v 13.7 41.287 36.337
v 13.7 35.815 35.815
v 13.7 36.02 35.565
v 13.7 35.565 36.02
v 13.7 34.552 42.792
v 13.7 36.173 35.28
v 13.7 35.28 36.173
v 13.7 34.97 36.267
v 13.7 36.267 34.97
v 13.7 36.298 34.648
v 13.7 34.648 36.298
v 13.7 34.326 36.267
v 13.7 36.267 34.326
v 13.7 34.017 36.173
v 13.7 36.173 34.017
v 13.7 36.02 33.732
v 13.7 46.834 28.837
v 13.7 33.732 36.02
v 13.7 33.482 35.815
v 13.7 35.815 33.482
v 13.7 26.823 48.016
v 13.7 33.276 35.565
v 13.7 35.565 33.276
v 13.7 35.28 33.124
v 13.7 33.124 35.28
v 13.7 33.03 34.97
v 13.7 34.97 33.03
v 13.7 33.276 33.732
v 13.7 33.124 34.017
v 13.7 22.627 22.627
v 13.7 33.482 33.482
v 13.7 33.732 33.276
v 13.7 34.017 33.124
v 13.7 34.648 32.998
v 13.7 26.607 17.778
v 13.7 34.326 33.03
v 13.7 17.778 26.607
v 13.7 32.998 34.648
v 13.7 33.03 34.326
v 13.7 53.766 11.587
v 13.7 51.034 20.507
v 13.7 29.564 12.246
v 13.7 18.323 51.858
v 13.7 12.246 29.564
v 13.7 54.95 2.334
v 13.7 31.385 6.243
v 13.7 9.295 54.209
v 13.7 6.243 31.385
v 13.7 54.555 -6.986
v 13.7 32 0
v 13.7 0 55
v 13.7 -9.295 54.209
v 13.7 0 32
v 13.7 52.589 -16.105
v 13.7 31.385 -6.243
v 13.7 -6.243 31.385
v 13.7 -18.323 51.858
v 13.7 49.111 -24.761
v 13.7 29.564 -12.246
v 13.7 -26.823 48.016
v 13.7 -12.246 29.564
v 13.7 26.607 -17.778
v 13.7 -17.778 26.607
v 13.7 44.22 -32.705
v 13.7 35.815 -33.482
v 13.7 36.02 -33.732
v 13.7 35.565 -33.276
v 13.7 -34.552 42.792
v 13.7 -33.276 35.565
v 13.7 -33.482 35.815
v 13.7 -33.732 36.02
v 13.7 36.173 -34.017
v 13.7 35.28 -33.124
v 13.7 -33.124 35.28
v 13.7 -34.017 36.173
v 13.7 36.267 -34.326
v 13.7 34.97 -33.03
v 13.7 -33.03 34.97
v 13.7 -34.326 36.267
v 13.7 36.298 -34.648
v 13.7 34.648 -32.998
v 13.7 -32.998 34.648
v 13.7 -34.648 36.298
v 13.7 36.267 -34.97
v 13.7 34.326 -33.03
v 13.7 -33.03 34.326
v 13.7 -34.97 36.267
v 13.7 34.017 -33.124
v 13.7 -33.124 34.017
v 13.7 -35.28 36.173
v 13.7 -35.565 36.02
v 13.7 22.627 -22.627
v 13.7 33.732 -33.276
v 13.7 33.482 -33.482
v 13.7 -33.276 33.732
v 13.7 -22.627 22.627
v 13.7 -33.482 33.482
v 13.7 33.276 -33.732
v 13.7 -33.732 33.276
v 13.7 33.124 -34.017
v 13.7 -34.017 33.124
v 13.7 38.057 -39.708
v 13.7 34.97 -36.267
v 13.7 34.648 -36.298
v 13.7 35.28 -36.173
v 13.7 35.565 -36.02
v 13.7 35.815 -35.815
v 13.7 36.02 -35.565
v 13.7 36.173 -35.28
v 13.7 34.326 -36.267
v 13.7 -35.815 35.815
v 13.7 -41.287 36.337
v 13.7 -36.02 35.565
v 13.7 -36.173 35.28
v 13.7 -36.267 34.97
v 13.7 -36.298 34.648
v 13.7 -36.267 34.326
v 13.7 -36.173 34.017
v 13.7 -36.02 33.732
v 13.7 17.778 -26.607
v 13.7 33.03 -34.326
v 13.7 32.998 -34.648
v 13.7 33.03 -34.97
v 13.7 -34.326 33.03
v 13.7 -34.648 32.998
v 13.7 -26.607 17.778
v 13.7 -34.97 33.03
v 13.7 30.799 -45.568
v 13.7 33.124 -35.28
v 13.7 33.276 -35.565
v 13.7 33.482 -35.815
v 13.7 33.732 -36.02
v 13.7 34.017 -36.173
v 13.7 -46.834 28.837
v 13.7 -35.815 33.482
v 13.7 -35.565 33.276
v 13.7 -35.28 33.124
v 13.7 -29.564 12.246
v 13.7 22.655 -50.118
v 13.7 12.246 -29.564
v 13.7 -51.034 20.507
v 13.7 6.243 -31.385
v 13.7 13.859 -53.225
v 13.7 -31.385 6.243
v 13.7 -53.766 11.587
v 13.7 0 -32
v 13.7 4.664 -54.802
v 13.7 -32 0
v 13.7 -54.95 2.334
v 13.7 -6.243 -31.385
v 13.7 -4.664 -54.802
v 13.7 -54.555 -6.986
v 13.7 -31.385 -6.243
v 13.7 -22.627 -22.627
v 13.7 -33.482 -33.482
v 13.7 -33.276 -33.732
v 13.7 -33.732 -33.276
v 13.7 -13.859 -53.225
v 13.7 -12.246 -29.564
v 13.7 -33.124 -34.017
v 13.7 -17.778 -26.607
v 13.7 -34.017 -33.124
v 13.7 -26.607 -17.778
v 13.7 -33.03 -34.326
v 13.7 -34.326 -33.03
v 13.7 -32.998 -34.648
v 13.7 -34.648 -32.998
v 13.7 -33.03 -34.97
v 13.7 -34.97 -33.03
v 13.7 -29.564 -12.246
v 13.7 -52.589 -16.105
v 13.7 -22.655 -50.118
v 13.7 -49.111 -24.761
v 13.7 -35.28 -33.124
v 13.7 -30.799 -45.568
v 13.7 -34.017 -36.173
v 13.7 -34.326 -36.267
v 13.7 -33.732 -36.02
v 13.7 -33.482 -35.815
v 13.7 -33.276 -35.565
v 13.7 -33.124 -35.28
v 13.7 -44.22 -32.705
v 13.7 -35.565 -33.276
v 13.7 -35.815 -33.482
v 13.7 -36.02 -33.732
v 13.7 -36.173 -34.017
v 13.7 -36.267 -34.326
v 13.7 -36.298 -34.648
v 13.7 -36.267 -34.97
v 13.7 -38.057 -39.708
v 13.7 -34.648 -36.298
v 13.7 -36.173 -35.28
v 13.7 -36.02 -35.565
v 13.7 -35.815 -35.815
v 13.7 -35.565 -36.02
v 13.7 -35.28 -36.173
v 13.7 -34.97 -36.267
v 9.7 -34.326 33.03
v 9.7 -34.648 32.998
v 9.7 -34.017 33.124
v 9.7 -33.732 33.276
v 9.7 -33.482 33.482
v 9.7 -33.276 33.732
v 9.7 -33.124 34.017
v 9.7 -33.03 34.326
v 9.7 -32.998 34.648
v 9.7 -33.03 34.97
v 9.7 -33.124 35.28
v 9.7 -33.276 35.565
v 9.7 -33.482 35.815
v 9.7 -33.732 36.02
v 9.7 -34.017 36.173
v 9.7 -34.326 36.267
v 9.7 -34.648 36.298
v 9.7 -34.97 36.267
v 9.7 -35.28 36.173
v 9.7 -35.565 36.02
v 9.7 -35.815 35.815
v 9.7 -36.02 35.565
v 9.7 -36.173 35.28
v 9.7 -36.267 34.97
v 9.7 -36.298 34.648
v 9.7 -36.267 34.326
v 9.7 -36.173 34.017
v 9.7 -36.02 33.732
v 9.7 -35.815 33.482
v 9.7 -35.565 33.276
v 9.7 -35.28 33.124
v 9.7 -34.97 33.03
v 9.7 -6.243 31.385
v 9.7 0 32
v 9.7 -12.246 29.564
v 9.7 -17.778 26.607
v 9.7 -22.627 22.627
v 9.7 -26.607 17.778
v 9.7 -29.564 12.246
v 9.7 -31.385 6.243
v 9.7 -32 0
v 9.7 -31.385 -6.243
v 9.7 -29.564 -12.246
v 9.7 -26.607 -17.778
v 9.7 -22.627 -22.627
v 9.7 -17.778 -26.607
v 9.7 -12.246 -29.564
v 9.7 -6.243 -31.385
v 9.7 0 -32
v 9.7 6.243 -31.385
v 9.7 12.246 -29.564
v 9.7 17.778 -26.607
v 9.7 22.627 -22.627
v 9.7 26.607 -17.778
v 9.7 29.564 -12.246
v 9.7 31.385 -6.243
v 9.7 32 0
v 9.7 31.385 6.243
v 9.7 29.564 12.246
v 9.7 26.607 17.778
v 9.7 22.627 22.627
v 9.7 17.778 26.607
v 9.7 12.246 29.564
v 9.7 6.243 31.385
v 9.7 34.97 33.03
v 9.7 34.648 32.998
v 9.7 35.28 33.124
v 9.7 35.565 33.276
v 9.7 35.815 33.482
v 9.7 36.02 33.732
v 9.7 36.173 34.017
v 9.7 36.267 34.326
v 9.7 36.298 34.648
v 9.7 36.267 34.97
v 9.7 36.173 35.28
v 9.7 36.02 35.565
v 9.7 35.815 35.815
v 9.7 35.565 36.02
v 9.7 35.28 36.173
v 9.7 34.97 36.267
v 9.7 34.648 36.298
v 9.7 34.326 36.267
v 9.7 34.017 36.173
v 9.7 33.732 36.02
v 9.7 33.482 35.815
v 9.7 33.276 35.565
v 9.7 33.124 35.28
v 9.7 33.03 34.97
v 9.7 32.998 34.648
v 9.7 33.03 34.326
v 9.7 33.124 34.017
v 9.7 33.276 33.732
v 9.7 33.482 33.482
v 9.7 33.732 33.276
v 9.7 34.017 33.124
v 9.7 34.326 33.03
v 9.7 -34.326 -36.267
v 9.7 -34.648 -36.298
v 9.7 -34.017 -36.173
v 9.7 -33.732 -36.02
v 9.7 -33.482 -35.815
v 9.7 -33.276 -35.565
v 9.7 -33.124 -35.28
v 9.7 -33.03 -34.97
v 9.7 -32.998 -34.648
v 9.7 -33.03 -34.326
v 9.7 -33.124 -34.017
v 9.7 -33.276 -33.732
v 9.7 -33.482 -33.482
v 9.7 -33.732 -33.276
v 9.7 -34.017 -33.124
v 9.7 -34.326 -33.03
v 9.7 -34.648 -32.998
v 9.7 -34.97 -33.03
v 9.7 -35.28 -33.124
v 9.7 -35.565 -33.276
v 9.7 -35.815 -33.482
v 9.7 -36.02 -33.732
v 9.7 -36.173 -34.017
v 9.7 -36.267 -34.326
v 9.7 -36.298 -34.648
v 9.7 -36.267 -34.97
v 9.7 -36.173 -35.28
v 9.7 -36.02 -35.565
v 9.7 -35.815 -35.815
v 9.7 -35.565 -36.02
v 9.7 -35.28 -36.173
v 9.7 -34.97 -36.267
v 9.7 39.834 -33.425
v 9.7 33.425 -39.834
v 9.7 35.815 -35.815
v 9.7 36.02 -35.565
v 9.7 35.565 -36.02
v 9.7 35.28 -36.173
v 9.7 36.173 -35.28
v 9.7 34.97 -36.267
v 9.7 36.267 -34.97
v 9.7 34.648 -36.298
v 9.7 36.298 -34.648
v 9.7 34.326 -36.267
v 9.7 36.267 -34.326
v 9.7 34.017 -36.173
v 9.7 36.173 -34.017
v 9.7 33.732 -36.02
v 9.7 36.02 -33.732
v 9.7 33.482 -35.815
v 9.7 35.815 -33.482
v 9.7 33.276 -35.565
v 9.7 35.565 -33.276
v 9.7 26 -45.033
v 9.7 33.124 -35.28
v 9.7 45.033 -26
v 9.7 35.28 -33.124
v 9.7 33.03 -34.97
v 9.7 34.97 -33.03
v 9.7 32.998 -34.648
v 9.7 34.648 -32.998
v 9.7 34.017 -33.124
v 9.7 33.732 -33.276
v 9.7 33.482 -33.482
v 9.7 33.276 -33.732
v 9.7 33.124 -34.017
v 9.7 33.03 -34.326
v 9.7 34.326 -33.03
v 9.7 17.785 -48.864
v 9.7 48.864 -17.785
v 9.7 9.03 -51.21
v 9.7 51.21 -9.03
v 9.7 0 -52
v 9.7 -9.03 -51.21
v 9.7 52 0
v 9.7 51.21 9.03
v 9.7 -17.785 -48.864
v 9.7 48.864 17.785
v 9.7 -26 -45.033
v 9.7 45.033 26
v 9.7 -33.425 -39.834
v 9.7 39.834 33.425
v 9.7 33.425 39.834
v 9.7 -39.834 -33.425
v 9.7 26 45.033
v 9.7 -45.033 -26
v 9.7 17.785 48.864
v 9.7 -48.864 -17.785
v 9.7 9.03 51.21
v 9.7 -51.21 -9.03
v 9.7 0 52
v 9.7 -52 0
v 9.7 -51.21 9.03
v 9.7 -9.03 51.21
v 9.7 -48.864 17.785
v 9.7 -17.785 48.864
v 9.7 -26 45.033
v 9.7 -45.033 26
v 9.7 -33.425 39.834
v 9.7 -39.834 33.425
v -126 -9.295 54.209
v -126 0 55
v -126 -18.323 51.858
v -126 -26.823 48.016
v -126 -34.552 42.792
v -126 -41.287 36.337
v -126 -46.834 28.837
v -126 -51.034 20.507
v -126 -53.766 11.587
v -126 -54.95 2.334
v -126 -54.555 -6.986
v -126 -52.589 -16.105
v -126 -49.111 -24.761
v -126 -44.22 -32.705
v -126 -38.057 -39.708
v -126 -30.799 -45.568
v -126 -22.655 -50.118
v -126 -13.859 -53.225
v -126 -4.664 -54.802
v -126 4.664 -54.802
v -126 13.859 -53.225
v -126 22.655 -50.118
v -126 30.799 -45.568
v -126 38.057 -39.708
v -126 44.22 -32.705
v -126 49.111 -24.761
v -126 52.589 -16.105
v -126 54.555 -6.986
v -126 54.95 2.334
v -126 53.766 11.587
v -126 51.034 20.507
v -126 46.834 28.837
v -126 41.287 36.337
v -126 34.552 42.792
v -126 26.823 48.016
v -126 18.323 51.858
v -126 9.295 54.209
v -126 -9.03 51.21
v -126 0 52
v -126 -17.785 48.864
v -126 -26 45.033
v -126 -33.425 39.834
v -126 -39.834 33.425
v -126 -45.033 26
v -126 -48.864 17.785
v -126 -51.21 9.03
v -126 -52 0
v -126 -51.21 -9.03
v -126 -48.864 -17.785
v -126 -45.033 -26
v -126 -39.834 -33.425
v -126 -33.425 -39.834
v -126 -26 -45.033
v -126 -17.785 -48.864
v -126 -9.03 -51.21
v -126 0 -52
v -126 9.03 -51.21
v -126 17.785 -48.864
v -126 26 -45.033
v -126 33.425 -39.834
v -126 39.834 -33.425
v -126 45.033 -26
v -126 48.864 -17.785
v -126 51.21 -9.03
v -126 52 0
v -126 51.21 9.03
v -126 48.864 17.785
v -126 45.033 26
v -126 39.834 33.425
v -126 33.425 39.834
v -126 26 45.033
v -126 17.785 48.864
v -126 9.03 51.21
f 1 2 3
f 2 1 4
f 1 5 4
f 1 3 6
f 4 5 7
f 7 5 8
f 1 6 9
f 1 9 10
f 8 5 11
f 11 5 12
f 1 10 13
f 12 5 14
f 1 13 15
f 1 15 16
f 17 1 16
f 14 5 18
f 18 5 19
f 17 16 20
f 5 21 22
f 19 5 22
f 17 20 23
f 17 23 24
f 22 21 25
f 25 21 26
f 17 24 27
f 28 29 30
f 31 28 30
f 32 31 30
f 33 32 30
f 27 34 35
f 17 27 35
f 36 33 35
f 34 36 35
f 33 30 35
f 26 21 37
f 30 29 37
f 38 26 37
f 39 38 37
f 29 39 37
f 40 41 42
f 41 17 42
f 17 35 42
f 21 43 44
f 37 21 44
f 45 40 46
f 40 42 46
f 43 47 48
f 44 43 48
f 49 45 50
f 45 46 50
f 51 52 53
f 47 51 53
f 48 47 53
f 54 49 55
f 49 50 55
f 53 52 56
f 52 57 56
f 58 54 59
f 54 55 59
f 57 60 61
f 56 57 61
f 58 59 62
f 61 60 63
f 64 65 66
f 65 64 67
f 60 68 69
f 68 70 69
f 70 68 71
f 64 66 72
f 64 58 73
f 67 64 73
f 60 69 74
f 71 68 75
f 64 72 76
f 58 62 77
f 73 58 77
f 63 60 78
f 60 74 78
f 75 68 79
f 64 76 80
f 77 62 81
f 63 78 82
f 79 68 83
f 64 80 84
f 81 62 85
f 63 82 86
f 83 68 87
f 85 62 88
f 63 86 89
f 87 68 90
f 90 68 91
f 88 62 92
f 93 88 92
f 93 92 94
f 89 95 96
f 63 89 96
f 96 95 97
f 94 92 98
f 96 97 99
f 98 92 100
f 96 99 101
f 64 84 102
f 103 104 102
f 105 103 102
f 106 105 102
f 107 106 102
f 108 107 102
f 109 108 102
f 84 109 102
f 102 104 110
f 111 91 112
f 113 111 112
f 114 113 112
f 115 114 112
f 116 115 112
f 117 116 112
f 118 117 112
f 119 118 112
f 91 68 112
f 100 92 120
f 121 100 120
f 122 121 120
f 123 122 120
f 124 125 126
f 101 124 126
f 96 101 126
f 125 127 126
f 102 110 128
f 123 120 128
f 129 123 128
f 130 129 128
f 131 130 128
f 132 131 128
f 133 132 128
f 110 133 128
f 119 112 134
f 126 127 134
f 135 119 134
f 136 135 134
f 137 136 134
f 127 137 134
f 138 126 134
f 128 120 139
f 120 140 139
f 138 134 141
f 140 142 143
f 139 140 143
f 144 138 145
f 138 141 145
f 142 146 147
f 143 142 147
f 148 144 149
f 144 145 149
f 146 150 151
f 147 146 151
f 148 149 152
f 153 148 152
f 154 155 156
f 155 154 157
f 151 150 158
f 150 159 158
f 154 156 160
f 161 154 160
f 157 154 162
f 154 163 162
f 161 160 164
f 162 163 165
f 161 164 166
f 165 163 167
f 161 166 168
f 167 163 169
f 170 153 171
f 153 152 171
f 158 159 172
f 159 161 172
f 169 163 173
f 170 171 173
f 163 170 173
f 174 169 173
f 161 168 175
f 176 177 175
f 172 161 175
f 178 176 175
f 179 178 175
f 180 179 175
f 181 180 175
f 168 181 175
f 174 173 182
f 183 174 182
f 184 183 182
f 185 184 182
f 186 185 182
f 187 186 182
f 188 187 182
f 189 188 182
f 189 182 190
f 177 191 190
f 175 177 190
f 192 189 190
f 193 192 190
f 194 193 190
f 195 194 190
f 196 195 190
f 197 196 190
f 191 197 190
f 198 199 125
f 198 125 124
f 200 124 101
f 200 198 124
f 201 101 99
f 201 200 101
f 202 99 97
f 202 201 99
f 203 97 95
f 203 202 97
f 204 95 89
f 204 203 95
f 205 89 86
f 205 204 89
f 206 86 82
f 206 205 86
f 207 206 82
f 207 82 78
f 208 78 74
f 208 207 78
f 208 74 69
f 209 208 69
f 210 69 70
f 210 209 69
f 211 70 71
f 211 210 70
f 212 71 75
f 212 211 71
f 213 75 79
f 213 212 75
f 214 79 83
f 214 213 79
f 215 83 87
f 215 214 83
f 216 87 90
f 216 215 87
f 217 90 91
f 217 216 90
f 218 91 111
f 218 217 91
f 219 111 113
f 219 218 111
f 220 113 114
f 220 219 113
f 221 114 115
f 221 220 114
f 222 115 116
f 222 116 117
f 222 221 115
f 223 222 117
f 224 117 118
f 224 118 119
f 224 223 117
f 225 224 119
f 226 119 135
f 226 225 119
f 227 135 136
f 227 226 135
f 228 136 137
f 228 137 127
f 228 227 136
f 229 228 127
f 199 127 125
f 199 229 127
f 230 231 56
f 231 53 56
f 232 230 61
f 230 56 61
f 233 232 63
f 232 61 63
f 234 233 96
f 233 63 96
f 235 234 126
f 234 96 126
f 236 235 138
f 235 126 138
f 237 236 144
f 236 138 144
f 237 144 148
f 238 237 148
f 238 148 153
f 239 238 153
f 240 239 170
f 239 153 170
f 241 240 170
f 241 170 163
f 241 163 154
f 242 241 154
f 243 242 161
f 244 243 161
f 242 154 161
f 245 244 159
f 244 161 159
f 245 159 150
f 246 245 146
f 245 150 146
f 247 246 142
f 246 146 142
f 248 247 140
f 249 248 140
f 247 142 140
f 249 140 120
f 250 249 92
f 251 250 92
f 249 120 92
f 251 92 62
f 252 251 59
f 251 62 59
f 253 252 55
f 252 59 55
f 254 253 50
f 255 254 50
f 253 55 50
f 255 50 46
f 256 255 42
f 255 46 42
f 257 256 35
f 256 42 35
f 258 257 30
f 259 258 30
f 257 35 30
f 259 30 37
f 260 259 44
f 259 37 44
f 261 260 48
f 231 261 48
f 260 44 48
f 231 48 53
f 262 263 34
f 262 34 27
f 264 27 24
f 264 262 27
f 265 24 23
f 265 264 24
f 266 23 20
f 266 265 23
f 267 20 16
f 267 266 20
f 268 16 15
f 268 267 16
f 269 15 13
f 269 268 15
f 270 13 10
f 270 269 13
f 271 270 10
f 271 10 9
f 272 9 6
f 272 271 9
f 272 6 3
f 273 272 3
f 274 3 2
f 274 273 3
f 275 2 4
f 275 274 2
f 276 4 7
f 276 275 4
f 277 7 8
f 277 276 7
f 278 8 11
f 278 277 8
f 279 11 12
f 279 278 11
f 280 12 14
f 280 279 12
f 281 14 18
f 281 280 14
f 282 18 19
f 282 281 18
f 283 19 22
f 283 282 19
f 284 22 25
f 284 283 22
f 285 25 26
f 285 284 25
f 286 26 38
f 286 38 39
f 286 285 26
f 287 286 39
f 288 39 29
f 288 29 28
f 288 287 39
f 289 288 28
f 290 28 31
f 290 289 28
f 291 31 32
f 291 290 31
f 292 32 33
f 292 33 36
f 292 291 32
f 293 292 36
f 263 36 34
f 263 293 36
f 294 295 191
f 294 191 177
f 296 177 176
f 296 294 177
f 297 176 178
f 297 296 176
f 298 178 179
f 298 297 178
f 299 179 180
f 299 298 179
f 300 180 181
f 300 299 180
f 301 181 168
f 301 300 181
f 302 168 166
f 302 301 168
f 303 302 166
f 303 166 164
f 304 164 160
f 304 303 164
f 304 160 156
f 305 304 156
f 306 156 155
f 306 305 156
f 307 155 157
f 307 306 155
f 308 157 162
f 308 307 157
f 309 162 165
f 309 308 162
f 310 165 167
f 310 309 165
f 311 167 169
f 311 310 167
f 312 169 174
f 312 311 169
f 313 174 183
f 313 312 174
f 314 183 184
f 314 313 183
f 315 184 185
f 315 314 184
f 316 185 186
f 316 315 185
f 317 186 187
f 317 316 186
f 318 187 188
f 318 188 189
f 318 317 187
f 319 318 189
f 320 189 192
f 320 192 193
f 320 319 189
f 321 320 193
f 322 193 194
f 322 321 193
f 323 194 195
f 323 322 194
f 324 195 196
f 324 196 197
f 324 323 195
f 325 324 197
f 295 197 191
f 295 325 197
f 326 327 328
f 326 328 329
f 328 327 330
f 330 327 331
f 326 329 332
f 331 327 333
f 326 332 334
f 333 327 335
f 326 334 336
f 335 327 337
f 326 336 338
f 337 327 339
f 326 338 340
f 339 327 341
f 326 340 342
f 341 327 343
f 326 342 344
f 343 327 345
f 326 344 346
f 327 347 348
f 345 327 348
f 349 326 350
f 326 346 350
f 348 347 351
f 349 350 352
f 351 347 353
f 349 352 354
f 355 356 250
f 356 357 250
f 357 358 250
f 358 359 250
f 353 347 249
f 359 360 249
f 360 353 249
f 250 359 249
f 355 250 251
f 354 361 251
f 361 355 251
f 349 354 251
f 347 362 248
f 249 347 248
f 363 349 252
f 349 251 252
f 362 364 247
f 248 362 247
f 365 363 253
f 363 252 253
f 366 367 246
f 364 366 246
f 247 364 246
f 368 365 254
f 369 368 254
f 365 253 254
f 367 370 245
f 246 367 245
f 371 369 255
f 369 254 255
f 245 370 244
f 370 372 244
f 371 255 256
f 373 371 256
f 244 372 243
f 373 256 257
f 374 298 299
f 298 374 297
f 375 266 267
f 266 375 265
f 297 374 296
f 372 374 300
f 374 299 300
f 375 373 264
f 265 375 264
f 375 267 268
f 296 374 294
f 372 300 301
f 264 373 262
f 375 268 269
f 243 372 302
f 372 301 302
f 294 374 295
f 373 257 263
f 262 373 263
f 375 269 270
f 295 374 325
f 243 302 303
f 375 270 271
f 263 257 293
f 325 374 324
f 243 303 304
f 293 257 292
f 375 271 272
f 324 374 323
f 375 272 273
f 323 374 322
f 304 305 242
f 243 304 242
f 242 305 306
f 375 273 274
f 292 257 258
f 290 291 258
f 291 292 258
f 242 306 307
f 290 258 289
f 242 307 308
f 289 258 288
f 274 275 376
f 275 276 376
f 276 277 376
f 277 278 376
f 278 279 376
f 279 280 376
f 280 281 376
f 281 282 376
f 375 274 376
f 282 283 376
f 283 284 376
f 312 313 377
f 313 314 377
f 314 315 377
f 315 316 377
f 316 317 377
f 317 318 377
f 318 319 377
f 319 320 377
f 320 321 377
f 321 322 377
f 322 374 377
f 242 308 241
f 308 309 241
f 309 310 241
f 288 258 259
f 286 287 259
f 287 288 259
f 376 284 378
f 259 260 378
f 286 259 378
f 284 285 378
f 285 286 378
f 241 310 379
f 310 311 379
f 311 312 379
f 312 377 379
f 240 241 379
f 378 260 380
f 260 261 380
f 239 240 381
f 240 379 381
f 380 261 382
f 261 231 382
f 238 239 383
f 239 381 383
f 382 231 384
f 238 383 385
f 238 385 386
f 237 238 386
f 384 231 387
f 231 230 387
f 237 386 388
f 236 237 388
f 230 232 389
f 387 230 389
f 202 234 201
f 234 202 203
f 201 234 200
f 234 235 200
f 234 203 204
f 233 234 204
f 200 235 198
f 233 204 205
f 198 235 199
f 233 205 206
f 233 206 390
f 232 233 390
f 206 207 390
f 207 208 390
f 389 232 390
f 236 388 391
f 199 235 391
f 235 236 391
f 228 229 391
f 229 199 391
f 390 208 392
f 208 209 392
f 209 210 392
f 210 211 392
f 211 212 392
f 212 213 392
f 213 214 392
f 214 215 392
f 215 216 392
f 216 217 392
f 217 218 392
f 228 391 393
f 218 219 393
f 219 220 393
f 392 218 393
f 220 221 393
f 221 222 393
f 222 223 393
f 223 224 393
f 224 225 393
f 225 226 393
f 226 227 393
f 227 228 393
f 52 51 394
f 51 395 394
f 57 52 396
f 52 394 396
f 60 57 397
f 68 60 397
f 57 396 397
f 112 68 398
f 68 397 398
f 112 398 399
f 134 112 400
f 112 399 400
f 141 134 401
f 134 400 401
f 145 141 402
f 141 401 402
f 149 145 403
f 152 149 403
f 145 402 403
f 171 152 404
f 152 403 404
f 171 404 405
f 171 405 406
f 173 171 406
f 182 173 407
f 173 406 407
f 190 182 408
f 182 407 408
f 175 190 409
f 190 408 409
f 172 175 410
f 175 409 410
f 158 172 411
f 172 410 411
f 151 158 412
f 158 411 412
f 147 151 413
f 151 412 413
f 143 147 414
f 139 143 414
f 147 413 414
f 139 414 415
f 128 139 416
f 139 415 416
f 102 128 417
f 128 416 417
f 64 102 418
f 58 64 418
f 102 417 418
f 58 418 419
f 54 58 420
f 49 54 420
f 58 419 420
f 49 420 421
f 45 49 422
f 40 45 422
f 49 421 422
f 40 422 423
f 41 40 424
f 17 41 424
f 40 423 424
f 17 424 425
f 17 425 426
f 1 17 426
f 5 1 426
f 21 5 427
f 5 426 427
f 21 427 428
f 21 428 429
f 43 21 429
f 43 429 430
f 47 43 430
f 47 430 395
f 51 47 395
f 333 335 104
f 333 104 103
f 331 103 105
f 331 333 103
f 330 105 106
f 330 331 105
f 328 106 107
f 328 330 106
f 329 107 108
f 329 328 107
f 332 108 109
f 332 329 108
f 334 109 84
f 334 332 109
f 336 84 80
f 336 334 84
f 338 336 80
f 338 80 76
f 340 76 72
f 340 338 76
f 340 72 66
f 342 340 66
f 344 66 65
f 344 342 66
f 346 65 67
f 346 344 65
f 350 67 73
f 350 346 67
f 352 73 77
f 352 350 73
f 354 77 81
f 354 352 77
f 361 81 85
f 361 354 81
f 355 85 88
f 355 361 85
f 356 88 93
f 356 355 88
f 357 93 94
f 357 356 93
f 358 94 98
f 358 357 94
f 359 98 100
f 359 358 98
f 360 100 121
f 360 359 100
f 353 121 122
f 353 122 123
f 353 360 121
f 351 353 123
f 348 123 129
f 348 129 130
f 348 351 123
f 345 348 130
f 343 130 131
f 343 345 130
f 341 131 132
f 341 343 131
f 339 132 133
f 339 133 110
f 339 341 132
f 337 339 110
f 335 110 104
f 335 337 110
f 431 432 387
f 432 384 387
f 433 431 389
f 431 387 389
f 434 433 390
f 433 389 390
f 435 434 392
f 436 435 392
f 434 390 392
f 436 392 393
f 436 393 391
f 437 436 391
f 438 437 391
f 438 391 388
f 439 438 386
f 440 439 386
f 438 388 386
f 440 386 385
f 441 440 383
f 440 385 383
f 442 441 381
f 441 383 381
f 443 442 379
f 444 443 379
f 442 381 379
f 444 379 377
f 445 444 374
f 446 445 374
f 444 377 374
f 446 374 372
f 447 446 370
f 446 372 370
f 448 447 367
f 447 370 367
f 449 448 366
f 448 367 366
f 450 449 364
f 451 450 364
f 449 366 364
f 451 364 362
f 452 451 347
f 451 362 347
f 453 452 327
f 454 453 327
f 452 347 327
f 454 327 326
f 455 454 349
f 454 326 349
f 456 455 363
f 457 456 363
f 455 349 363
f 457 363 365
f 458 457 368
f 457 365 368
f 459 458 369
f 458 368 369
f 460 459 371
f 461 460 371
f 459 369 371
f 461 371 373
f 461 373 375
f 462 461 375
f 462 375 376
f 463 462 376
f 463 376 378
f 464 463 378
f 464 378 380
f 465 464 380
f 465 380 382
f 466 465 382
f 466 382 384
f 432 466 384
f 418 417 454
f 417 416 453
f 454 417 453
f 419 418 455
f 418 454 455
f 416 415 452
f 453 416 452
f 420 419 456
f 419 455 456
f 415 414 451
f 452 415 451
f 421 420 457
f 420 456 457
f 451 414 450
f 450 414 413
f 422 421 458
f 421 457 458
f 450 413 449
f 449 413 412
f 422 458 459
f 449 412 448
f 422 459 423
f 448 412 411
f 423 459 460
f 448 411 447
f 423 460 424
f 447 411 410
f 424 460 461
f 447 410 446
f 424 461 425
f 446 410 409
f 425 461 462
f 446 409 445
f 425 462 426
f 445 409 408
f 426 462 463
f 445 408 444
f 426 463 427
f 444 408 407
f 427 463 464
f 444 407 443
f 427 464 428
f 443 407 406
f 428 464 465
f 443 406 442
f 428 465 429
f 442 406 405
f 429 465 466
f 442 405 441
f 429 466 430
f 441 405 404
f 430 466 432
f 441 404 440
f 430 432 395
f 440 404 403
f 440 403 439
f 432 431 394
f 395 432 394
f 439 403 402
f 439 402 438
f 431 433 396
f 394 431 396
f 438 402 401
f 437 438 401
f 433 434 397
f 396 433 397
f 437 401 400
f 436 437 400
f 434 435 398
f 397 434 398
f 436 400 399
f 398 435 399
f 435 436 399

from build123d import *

# Parameters (mm, degrees)
AXIAL_START       = 9.7
SKETCH2_R         = 1.65
AXIAL_HOLES_DEPTH = 4


with BuildPart() as part:
    # Axial profile (mm) → Full revolution (revolve)
    with BuildSketch(Plane.XY, mode=Mode.PRIVATE) as full_revolution_sk:
        Polygon((-126, 52), (9.7, 52), (9.7, 32), (13.7, 32), (13.7, 55), (-126, 55), align=None)
    revolve(full_revolution_sk.sketch.rotate(Axis((-110, 0, 0), (1, 0, 0)), 90), axis=Axis((-110, 0, 0), (1, 0, 0)))

    # Sketch2 → Axial holes (cut)
    with BuildSketch(Plane(origin=(0, 0, 0), x_dir=(0, 0, -1), z_dir=(1, 0, 0)).offset(AXIAL_START)):
        with Locations((-34.648232278, 34.648232278)):
            Circle(SKETCH2_R)
        with Locations((-34.648232278, -34.648232278)):
            Circle(SKETCH2_R)
        with Locations((34.648232278, -34.648232278)):
            Circle(SKETCH2_R)
        with Locations((34.648232278, 34.648232278)):
            Circle(SKETCH2_R)
    extrude(amount=AXIAL_HOLES_DEPTH, mode=Mode.SUBTRACT)


solid = part.part
